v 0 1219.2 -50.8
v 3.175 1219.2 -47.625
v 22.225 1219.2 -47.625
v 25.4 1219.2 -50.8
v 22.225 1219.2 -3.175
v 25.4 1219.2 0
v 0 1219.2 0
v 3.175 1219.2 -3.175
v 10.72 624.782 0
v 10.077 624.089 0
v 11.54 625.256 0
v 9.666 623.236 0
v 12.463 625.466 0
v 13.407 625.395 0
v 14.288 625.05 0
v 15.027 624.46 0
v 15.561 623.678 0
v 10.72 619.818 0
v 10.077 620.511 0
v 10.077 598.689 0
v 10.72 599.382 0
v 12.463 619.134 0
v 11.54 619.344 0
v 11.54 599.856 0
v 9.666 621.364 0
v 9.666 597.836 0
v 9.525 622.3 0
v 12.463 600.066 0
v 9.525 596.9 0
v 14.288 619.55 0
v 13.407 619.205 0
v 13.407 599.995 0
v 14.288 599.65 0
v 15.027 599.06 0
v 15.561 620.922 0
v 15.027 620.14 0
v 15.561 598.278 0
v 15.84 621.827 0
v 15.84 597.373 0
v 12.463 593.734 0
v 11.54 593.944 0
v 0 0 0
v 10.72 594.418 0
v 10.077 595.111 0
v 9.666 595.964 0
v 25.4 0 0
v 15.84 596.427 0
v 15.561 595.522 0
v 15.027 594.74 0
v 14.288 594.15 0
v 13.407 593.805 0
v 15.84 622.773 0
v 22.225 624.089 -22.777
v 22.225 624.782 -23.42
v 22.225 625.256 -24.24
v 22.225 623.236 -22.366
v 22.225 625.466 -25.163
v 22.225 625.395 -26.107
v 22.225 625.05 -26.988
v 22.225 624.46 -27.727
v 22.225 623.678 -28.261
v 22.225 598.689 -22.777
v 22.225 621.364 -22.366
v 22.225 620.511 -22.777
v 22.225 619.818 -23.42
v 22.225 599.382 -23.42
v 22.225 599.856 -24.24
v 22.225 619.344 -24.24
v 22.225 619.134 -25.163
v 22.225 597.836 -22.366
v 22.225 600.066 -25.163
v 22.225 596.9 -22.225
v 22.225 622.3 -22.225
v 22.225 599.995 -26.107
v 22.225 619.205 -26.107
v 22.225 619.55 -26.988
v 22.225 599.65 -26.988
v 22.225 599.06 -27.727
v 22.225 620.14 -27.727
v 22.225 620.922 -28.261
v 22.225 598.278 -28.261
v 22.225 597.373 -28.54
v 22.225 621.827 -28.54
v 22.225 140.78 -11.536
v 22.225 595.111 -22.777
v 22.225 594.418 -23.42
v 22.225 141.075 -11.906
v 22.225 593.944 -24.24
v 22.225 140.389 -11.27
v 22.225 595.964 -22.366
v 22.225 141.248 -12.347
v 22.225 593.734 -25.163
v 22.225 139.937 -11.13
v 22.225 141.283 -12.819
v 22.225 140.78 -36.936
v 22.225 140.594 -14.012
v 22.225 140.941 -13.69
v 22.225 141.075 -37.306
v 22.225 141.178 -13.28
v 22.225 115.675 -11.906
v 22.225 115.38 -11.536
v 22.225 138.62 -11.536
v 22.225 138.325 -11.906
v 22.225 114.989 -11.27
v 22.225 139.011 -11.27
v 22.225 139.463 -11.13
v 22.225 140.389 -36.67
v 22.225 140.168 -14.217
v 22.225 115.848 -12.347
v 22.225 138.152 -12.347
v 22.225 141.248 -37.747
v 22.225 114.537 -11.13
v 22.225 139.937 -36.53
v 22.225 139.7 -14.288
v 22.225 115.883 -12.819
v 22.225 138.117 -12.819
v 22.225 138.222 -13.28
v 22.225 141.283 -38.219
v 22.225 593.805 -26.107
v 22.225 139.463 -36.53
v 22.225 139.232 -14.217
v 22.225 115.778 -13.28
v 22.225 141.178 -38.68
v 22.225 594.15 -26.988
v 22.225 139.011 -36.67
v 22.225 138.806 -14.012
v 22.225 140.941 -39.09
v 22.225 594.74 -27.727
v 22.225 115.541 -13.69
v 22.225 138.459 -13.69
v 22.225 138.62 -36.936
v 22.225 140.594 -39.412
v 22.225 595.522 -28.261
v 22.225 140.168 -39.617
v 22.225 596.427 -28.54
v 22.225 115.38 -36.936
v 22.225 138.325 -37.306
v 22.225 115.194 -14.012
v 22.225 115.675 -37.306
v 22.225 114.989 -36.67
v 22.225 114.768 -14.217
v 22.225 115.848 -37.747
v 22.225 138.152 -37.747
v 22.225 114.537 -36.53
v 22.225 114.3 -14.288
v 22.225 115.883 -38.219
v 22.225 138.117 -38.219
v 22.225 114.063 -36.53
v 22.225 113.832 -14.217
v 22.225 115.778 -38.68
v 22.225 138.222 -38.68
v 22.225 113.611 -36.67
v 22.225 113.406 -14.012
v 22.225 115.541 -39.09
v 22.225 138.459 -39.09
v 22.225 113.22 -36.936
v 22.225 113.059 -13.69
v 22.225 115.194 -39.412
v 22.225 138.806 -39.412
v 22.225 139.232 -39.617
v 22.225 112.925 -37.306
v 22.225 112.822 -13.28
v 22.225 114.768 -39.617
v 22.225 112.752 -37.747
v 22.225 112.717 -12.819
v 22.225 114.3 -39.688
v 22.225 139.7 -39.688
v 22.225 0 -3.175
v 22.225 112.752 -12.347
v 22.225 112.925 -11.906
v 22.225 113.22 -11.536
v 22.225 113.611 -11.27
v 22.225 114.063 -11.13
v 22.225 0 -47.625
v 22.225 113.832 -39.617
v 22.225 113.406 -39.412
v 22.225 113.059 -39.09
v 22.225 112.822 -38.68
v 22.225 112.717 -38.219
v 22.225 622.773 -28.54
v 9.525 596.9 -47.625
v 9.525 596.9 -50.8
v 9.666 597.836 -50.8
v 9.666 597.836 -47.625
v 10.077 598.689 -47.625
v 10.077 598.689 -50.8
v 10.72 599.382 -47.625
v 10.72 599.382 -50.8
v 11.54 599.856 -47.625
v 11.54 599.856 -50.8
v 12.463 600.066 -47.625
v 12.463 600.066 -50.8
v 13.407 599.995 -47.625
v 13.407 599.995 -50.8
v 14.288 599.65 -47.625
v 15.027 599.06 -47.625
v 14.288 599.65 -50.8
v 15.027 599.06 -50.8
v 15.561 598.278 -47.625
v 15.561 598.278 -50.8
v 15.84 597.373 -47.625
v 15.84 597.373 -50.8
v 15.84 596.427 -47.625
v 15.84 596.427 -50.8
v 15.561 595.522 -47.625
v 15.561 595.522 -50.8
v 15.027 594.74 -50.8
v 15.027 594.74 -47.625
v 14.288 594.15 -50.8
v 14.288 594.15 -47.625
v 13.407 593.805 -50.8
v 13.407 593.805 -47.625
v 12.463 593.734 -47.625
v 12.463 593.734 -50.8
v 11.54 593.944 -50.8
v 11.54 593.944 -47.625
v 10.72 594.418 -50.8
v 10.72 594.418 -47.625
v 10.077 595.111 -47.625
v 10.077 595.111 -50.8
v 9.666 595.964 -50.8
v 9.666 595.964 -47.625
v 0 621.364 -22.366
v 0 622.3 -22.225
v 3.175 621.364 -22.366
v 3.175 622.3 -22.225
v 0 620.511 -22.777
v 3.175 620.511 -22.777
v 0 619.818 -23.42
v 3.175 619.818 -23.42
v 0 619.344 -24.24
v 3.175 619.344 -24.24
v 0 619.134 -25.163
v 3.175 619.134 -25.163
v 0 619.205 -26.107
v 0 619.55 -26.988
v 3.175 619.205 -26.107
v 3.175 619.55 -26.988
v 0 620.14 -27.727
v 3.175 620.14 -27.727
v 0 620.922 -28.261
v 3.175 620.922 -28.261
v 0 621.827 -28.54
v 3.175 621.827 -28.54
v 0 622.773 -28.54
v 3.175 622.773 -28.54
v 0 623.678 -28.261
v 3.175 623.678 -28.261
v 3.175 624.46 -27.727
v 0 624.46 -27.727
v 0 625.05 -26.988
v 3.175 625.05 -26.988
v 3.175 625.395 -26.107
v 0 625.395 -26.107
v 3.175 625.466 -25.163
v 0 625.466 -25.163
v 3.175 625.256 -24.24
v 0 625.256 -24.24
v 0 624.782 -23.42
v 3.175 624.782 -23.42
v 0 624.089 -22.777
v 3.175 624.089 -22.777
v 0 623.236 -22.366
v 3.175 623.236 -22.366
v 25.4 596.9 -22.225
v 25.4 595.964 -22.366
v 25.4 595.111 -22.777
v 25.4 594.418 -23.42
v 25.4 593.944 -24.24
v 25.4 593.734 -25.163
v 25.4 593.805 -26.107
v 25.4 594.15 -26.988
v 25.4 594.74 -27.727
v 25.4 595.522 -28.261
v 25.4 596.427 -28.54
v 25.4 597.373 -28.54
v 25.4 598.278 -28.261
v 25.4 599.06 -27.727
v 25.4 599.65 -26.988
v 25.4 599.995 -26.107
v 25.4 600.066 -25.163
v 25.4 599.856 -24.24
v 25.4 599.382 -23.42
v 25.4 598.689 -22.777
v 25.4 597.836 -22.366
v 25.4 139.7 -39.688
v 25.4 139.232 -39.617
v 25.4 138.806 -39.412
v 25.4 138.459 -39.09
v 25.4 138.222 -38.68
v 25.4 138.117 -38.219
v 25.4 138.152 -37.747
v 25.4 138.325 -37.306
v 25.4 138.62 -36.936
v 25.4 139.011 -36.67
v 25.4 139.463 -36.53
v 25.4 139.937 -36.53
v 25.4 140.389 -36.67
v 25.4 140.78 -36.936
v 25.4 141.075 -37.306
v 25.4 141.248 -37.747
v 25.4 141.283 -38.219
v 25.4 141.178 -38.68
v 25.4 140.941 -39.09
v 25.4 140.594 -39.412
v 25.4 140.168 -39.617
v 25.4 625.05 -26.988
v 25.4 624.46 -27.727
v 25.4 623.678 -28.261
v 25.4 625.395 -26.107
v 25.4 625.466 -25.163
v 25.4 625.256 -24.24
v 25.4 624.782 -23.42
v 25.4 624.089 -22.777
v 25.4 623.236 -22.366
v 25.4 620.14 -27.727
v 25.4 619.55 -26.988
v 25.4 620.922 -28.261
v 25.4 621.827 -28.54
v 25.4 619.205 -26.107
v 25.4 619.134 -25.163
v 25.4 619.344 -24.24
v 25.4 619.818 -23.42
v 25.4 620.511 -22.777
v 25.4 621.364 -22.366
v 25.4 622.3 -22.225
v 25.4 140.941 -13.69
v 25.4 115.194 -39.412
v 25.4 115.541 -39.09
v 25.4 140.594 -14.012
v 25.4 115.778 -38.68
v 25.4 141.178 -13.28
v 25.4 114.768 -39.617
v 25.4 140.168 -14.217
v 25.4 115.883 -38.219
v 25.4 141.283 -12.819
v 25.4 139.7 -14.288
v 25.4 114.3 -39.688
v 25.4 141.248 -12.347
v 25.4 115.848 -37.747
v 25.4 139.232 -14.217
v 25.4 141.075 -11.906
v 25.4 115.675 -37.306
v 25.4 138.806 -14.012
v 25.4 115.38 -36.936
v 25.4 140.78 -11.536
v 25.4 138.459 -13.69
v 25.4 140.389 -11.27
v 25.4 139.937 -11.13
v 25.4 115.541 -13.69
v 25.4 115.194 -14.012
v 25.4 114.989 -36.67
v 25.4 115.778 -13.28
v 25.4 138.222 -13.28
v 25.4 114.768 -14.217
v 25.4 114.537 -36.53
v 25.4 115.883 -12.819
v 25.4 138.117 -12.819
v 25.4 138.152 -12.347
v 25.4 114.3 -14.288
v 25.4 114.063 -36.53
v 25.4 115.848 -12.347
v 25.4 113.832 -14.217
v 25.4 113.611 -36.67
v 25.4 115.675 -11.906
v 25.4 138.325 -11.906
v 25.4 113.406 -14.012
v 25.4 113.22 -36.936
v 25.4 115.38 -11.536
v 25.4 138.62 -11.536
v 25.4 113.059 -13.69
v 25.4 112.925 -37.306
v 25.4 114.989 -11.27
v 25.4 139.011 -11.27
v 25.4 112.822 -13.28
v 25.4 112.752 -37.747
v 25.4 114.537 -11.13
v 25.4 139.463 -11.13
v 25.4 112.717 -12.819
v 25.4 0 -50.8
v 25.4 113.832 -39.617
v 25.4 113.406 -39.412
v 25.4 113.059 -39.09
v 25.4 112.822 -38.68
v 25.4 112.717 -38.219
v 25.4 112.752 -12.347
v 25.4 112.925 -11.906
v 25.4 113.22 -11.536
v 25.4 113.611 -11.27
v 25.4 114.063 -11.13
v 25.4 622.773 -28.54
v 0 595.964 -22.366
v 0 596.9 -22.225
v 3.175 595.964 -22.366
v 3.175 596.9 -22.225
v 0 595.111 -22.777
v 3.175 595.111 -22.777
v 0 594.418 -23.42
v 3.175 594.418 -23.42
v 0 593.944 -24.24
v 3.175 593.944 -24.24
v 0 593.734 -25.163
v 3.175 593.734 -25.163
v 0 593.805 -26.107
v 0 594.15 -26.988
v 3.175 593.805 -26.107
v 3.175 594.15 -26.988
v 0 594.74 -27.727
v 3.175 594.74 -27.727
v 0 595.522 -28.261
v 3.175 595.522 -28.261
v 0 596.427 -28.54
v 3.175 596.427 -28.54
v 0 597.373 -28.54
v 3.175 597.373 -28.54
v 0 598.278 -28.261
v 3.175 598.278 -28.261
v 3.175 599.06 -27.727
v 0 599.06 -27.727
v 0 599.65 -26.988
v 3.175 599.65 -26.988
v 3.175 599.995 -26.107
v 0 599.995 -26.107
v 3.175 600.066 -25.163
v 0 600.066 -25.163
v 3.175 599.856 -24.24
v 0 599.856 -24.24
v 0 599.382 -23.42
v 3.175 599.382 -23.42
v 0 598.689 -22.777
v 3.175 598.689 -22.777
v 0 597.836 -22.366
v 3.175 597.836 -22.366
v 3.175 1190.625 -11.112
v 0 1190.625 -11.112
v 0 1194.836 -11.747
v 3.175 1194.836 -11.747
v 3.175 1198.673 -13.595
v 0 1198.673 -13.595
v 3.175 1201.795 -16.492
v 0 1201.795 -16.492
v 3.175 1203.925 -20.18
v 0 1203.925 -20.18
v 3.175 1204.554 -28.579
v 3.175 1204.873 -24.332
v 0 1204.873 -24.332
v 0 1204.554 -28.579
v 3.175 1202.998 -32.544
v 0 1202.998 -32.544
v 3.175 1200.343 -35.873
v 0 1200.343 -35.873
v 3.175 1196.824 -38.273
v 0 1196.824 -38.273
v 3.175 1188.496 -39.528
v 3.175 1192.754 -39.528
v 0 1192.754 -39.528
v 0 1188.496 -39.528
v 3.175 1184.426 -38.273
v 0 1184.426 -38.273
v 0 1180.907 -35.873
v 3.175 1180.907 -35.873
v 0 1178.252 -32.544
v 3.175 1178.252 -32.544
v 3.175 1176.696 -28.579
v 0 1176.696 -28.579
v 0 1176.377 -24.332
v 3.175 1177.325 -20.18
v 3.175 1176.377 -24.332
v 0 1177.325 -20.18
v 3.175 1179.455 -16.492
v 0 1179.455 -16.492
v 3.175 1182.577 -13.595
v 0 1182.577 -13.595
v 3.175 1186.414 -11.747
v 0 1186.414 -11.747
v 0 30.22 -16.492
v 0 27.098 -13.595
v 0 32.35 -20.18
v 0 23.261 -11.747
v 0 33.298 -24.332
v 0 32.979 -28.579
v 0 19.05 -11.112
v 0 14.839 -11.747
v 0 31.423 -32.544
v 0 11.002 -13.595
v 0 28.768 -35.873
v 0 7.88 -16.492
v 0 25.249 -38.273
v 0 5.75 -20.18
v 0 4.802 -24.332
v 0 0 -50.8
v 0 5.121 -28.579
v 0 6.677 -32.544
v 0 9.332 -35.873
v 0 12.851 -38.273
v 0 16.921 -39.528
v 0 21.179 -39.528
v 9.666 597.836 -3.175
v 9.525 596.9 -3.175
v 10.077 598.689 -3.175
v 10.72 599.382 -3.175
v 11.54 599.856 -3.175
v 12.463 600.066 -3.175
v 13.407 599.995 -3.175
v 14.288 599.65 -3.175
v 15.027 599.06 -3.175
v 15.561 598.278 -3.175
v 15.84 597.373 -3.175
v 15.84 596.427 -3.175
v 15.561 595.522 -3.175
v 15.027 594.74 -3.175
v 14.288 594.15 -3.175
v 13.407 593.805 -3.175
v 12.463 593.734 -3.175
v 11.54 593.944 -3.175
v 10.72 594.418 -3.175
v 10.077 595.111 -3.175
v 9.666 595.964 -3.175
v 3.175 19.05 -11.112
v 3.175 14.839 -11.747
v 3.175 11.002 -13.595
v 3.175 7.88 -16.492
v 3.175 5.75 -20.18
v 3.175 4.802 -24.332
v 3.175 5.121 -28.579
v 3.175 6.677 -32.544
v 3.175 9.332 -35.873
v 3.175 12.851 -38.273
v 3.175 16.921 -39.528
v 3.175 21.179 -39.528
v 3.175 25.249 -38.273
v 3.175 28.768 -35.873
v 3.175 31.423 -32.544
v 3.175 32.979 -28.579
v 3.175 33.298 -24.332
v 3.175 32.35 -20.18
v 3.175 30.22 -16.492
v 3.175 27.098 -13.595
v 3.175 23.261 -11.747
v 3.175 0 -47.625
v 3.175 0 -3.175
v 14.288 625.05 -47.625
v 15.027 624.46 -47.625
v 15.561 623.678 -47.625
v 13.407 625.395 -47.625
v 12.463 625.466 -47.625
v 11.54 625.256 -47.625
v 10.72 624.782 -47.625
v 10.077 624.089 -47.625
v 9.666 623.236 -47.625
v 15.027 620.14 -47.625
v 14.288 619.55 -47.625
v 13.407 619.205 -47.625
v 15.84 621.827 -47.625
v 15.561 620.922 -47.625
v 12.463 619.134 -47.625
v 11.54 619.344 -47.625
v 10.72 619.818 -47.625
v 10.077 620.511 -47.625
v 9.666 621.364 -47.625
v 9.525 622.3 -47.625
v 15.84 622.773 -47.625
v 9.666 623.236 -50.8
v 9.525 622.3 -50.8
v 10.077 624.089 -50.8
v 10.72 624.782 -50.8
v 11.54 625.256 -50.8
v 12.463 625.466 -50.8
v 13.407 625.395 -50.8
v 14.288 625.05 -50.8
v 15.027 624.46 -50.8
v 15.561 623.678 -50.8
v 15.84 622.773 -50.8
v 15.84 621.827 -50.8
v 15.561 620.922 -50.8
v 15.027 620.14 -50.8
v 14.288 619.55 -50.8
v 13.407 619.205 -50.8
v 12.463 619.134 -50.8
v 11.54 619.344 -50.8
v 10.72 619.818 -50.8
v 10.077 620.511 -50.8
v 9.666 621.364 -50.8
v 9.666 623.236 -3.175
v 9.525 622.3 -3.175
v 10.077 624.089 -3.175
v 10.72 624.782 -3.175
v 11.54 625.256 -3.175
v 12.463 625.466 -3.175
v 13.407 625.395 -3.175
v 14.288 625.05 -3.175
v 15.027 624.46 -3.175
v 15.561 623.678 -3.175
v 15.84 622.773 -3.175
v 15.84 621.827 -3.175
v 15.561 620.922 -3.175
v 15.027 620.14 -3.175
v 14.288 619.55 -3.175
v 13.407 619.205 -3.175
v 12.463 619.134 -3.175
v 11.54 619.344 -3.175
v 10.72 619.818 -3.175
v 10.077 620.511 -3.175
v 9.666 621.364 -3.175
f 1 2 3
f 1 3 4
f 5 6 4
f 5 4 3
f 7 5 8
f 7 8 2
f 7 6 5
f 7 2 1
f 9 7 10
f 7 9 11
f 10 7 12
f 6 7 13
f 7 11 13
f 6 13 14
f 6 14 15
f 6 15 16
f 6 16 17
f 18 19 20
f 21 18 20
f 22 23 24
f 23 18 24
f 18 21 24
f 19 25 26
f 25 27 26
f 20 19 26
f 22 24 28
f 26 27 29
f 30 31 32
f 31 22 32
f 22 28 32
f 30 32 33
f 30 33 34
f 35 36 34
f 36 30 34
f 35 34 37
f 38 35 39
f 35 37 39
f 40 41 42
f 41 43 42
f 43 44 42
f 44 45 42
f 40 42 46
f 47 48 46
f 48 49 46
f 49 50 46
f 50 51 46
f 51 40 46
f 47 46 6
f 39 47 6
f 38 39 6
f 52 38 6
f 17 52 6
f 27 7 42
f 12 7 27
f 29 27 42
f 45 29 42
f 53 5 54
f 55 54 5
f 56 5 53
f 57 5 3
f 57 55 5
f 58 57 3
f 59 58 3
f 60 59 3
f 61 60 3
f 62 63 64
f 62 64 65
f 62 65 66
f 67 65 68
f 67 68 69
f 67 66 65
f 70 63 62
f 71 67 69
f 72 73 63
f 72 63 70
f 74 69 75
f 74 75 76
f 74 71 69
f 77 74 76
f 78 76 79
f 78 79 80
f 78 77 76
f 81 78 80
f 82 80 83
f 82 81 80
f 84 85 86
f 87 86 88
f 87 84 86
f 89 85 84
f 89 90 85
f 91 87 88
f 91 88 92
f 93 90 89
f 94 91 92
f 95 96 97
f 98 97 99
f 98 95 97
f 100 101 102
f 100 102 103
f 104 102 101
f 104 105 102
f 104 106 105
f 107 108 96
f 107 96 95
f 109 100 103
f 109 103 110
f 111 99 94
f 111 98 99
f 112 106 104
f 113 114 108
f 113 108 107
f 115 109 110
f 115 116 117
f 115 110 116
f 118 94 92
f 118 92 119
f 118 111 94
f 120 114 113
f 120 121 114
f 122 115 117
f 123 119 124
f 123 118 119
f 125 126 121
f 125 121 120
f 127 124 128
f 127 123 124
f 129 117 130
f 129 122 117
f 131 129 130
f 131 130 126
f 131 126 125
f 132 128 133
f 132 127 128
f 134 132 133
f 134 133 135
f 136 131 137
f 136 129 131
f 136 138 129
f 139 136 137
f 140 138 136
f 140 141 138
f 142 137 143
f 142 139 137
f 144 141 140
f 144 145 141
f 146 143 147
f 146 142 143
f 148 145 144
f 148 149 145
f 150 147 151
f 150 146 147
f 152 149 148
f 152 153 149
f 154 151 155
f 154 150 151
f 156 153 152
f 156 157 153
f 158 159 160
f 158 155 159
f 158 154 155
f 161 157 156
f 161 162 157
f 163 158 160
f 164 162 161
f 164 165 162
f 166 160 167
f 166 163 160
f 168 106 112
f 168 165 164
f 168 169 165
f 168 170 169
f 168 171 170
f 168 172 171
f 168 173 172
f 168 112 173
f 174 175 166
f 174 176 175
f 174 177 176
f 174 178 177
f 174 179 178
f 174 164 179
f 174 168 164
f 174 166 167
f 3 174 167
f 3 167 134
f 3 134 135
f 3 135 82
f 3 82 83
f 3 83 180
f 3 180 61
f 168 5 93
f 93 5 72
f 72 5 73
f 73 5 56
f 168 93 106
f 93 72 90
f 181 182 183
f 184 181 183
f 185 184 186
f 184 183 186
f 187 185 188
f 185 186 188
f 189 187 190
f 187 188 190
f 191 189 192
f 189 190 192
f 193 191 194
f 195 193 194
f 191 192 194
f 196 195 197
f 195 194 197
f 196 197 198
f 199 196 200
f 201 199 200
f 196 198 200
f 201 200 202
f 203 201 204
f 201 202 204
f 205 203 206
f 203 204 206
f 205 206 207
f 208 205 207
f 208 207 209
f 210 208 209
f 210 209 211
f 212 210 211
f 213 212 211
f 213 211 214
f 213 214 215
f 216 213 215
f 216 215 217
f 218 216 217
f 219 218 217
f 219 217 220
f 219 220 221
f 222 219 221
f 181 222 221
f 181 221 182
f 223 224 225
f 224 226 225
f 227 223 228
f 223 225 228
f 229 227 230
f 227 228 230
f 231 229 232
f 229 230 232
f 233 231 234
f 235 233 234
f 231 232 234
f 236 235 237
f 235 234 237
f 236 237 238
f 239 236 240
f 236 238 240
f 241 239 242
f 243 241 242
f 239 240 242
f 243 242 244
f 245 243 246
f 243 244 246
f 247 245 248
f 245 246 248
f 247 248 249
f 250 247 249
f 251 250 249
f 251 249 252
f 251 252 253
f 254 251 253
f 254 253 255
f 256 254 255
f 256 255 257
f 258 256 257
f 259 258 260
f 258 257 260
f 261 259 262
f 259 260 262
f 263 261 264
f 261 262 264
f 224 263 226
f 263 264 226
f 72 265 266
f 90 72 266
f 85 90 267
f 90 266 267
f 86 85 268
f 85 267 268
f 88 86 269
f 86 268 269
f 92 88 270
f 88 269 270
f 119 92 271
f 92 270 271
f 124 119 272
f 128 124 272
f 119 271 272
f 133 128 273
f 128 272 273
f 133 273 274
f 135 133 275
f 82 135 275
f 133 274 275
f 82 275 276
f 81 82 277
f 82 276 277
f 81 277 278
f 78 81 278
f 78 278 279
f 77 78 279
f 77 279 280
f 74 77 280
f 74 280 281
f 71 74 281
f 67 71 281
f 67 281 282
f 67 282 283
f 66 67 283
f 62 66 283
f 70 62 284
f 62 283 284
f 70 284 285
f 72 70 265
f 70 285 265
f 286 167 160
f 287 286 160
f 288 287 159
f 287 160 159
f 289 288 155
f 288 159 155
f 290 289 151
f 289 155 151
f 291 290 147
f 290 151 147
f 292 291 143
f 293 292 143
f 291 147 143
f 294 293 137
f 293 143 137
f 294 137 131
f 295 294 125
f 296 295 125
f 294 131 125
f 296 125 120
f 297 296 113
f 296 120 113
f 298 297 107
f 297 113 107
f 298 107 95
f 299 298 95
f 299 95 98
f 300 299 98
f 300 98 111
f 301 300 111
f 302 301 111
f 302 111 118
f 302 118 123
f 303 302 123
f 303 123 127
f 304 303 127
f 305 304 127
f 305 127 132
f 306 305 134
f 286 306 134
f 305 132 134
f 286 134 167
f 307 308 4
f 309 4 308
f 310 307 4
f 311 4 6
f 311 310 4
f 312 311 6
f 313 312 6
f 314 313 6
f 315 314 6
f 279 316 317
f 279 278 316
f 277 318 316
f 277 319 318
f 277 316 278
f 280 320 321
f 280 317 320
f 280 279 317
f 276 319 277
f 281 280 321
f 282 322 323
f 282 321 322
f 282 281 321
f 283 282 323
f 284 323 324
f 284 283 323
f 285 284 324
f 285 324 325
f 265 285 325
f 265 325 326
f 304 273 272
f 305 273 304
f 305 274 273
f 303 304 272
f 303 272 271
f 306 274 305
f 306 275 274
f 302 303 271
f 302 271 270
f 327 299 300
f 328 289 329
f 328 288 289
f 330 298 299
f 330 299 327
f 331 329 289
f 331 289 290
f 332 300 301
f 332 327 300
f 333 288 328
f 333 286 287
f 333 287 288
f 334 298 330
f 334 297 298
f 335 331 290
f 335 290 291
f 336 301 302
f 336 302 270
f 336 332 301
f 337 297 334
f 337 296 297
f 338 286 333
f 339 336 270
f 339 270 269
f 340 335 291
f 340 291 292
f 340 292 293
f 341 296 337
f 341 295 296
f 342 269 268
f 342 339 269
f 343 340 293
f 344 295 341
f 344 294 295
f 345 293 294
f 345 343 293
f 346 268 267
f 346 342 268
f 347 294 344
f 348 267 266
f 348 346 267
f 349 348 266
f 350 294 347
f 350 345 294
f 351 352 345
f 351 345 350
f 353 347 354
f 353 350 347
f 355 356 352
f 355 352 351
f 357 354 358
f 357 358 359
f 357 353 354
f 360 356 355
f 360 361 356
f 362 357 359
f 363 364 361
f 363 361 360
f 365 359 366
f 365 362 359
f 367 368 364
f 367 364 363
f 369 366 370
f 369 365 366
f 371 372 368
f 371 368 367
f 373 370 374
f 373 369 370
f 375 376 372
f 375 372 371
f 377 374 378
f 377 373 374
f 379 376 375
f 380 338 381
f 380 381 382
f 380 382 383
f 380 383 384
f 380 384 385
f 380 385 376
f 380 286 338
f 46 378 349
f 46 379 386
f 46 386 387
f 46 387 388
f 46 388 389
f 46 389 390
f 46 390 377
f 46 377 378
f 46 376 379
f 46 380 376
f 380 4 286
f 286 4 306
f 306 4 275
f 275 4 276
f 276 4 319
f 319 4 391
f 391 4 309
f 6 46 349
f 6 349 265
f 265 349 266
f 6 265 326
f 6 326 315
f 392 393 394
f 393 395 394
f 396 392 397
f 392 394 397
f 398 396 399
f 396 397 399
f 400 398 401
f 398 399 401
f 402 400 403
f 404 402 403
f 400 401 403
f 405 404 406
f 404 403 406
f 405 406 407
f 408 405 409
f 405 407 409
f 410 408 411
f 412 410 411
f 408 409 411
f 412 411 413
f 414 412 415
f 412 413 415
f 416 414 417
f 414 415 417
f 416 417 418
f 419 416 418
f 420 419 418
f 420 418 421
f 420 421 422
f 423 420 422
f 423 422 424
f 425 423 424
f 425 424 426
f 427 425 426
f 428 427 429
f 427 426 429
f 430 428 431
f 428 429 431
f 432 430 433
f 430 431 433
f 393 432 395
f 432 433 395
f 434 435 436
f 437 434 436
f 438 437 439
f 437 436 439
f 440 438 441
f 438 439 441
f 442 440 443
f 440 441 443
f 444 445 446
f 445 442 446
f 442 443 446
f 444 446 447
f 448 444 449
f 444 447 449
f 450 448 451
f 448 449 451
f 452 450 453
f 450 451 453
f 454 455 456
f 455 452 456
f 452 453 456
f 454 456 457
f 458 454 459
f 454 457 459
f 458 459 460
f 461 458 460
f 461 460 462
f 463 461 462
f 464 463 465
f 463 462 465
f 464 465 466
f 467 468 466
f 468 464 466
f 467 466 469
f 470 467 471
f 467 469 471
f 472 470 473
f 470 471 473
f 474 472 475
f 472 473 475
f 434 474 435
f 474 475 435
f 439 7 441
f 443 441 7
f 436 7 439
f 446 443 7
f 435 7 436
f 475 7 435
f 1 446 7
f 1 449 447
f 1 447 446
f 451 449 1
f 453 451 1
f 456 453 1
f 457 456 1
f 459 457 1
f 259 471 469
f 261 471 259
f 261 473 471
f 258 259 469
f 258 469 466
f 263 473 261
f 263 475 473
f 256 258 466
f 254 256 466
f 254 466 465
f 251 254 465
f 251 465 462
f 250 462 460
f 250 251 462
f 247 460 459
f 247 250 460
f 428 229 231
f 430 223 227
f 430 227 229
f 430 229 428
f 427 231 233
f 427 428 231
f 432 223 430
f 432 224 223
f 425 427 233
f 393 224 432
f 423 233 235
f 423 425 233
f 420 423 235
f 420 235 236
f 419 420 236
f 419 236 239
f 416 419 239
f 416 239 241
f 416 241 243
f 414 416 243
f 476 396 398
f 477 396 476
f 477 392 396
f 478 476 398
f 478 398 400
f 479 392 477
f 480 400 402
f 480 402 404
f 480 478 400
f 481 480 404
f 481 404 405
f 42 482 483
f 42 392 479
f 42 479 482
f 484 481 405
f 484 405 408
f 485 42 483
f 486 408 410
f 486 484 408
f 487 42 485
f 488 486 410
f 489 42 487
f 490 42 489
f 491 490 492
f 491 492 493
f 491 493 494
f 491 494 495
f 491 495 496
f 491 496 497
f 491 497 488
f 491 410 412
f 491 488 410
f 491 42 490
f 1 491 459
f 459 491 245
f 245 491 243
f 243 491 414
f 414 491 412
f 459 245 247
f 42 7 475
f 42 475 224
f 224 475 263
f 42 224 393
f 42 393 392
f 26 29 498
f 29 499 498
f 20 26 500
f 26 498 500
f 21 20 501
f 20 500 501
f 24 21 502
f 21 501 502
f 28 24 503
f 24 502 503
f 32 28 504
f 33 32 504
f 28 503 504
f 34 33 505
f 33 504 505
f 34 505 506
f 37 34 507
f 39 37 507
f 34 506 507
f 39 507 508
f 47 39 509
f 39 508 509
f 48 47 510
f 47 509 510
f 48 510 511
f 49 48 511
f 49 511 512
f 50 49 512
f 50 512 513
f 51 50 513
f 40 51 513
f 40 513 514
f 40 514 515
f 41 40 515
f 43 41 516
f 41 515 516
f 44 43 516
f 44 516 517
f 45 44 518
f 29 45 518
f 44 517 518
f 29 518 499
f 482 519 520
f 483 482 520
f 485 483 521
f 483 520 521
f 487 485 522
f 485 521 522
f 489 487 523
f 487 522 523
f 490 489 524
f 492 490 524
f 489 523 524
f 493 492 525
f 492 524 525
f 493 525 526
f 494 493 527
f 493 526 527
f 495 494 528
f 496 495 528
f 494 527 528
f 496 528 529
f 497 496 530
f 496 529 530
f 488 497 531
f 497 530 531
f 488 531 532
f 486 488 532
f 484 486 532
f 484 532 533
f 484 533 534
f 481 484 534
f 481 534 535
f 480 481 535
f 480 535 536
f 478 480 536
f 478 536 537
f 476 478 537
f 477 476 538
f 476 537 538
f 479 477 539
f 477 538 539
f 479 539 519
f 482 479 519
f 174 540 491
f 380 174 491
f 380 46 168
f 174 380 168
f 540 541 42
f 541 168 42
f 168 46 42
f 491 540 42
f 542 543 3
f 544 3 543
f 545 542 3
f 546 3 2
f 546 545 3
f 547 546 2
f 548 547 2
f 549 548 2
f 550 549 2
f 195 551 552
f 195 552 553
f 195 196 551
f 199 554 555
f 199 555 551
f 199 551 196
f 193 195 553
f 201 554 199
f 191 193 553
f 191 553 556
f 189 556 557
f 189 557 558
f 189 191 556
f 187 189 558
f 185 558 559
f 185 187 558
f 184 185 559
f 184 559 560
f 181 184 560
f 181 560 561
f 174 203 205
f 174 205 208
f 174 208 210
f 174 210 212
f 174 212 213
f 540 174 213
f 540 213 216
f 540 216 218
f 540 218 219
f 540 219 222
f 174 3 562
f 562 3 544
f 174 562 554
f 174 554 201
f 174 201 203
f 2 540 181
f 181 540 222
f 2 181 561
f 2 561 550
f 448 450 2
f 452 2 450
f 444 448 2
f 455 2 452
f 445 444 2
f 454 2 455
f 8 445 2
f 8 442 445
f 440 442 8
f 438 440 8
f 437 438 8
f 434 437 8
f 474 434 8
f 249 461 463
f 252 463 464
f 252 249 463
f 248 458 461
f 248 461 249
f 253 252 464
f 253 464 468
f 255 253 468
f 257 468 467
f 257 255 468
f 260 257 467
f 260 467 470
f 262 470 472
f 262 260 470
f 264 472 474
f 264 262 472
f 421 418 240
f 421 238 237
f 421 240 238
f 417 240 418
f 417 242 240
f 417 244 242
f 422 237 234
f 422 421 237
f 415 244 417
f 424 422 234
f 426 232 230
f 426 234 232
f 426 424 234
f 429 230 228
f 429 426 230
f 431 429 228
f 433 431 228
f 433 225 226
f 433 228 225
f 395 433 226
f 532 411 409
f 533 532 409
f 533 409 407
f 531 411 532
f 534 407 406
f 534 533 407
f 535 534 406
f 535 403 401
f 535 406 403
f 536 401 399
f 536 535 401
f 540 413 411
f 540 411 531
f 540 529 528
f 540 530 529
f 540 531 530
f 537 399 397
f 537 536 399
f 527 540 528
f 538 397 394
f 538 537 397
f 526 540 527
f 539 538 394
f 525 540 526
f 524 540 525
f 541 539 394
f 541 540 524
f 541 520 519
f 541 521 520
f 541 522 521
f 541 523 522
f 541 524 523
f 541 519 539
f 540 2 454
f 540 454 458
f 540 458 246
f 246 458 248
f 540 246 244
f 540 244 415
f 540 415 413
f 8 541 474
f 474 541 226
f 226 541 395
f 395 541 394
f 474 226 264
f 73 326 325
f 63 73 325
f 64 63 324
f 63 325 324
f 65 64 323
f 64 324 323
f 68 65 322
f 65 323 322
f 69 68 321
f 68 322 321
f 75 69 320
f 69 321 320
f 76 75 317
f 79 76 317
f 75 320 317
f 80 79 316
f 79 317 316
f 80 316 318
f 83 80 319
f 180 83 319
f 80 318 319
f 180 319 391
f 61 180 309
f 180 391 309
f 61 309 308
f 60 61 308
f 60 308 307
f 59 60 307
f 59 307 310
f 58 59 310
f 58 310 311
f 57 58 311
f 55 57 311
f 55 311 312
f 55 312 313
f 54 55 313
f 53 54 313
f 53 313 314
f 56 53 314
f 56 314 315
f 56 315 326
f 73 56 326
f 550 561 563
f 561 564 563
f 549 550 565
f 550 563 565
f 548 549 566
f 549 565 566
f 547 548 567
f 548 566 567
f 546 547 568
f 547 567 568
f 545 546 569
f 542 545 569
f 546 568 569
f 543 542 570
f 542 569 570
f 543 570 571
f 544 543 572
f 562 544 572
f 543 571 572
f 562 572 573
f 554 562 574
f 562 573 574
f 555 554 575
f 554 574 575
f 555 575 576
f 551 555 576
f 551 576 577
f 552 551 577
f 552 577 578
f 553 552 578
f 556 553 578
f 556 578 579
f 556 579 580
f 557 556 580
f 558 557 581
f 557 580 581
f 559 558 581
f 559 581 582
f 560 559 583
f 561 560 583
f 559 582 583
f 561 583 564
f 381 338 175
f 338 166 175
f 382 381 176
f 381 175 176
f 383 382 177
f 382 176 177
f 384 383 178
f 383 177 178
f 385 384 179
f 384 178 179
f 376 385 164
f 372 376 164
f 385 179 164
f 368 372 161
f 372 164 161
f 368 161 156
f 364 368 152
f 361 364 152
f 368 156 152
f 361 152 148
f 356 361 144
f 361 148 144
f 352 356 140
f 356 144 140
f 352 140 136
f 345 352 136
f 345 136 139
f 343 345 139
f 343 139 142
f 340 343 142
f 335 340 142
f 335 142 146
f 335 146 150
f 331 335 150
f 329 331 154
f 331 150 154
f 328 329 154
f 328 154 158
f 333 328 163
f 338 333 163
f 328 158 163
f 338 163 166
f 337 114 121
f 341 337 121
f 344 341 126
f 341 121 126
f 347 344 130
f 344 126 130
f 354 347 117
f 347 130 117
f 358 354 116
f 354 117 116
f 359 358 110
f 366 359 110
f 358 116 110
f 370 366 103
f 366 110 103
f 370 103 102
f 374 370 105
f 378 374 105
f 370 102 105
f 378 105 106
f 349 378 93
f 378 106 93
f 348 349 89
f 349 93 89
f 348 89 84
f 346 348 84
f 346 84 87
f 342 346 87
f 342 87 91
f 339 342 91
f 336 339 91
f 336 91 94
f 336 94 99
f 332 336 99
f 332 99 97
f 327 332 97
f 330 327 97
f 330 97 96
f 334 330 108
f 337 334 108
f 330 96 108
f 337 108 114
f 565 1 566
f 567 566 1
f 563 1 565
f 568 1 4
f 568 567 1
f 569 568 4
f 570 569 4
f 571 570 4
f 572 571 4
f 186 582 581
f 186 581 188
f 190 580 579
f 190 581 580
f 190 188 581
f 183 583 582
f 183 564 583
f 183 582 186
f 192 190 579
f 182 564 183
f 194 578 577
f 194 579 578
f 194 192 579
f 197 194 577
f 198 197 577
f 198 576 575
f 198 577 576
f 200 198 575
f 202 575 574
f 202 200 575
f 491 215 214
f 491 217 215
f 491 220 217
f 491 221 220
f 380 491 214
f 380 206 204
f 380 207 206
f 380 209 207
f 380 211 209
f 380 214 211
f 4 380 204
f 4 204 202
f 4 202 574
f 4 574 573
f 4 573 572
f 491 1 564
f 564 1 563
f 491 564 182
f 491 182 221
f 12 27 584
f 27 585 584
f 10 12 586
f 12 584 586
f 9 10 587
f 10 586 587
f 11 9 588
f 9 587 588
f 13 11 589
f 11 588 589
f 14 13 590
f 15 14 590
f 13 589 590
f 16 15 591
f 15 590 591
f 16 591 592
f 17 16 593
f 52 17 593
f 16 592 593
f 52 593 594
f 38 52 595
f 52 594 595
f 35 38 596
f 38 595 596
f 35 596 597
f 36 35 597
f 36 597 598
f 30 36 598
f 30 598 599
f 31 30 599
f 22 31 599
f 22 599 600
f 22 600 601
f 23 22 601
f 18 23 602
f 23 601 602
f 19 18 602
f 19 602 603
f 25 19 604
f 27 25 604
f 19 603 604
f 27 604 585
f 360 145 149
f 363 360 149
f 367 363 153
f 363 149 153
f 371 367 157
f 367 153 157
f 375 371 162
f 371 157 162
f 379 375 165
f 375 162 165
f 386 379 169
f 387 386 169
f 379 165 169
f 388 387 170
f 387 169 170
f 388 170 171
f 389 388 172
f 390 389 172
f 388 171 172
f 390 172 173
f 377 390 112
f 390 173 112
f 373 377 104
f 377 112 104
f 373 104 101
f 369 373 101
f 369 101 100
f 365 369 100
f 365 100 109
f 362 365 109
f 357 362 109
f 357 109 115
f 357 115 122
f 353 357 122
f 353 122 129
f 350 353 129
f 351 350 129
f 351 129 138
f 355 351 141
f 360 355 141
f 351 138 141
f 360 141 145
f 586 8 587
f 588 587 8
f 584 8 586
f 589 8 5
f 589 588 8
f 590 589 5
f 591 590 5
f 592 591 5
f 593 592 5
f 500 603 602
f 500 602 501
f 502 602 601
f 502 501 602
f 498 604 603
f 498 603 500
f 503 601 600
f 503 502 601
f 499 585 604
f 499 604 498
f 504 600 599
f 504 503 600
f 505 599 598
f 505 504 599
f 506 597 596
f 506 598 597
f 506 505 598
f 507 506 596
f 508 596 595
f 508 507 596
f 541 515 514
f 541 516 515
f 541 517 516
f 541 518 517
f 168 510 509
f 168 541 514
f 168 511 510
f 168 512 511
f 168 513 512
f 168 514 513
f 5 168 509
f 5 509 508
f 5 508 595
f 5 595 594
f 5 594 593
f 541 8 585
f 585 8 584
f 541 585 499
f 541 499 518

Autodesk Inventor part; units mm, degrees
ref_plane "YZ Plane" through (0, 0, 0) normal (1, 0, 0) x (0, 1, 0)
ref_plane "XZ Plane" through (0, 0, 0) normal (0, 1, 0) x (-1, 0, 0)
ref_plane "XY Plane" through (0, 0, 0) normal (0, 0, 1) x (1, 0, 0)
sketch "Sketch2" plane through (0, 0, 0) normal (0, 1, 0) x (-1, 0, 0)
  line L0 (0, 0) -> (-25.4, 0)
  line L1 (-25.4, 0) -> (0, 0)
  line L2 (0, 0) -> (0, -50.8)
  line L3 (0, -50.8) -> (-25.4, -50.8)
  line L4 (-25.4, -50.8) -> (-25.4, 0)
  line L5 (-22.225, -47.625) -> (-3.175, -47.625)
  line L6 (-3.175, -47.625) -> (-3.175, -3.175)
  line L7 (-3.175, -3.175) -> (-22.225, -3.175)
  line L8 (-22.225, -3.175) -> (-22.225, -47.625)
  dimension "d2" = 25.4
  dimension "d3" = 50.8
  dimension "d4" = 19.05
  dimension "d5" = 44.45
  dimension "d6" = 3.175
  dimension "d7" = 3.175
extrude "Extrusion1" add sketch "Sketch2" along normal blind 1219.2
sketch "Sketch3" plane through (25.4, 0, -50.8) normal (0, 0, -1) x (-1, 0, 0)
  line L0 (25.4, 1219.2) -> (25.4, 609.6) construction
  line L1 (25.4, 0) -> (25.4, 1219.2) projected
  line L2 (25.4, 609.6) -> (0, 609.6) construction
  line L3 (0, 0) -> (0, 1219.2) projected
  line L4 (12.7, 609.6) -> (12.7, 622.3) construction
  circle A0 centre (12.7, 622.3) radius 3.175
  line L5 (12.7, 609.6) -> (12.7, 596.9) construction
  circle A1 centre (12.7, 596.9) radius 3.175
  dimension "d10" = 1219.2
  dimension "d11" = 609.6
  dimension "d12" = 12.7
  dimension "d13" = 6.35
extrude "Extrusion2" cut sketch "Sketch3" against normal blind 1219.2
sketch "Sketch4" plane through (0, 0, -50.8) normal (-1, 0, 0) x (0, 0, 1)
  line L0 (3.175, 1219.2) -> (47.625, 1219.2) projected
  line L1 (25.4, 1219.2) -> (25.4, 1190.625)
  circle A0 centre (25.4, 1190.625) radius 14.2875
  point P0 (50.8, 0)
  dimension "d16" = 28.575
  dimension "d17" = 28.575
extrude "Extrusion3" cut sketch "Sketch4" against normal blind 6.35
sketch "Sketch5" plane through (25.4, 0, 0) normal (1, 0, 0) x (0, 0, -1)
  line L0 (47.625, 0) -> (3.175, 0) construction
  line L1 (25.4, 0) -> (25.4, 114.3) construction
  line L2 (50.8, 0) -> (50.8, 1219.2) construction
  line L3 (50.8, 0) -> (38.1, 0) construction
  circle A0 centre (38.1, 114.3) radius 1.5875
  circle A1 centre (12.7, 114.3) radius 1.5875
  line L4 (0, 0) -> (0, 1219.2) construction
  line L5 (0, 127) -> (50.8, 127) construction
  circle A2 centre (38.1, 139.7) radius 1.5875
  circle A3 centre (12.7, 139.7) radius 1.5875
  dimension "d20" = 114.3
  dimension "d21" = 12.7
  dimension "d22" = 3.175
hole "Hole1" at (25.4, 139.7, -12.7) at (25.4, 114.3, -12.7) at (25.4, 114.3, -38.1) at (25.4, 139.7, -38.1) direction (-1, 0, 0) diameter 3.175 depth 3.175 tip angle 118
sketch "Sketch7" plane through (0, 0, -50.8) normal (-1, 0, 0) x (0, 0, 1)
  circle A0 centre (25.4, 19.05) radius 14.7752
  point P0 (50.8, 0)
  point P1 (39.6875, 22.815)
hole "Hole3" at (0, 19.05, -25.4) direction (1, 0, 0) diameter 28.575 depth 3.175 tip angle 118
sketch "Sketch8" plane through (25.4, 0, 0) normal (1, 0, 0) x (0, 0, -1)
  point P0 (0, 0)
sketch "Sketch9" plane through (0, 0, 0) normal (0, 0, 1) x (1, 0, 0)
  circle A0 centre (12.7, 596.9) radius 3.175 projected
  line L0 (12.7, 596.9) -> (12.7, 0)
  point P0 (0, 0)
  dimension "d48" = 596.9
sketch "Sketch10" plane through (0, 0, -50.8) normal (-1, 0, 0) x (0, 0, 1)
  circle A0 centre (25.4, 596.9) radius 3.175
  line L0 (50.8, 0) -> (50.8, 1219.2) projected
  line L1 (50.8, 0) -> (0, 0) projected
  line L2 (0, 0) -> (0, 1219.2) projected
  line L3 (0, 609.6) -> (50.8, 609.6)
  line L4 (50.8, 0) -> (50.8, 1219.2) projected
  line L5 (0, 1219.2) -> (50.8, 1219.2) projected
  circle A1 centre (25.4, 622.3) radius 3.175
  dimension "d49" = 6.35
  dimension "d50" = 25.4
  dimension "d51" = 596.9
  dimension "d52" = 609.6
hole "Hole4" at (0, 622.3, -25.4) at (0, 596.9, -25.4) direction (1, 0, 0) diameter 6.35 depth 25.4 tip angle 118
properties part number "main beam" material "Aluminum 6061"
